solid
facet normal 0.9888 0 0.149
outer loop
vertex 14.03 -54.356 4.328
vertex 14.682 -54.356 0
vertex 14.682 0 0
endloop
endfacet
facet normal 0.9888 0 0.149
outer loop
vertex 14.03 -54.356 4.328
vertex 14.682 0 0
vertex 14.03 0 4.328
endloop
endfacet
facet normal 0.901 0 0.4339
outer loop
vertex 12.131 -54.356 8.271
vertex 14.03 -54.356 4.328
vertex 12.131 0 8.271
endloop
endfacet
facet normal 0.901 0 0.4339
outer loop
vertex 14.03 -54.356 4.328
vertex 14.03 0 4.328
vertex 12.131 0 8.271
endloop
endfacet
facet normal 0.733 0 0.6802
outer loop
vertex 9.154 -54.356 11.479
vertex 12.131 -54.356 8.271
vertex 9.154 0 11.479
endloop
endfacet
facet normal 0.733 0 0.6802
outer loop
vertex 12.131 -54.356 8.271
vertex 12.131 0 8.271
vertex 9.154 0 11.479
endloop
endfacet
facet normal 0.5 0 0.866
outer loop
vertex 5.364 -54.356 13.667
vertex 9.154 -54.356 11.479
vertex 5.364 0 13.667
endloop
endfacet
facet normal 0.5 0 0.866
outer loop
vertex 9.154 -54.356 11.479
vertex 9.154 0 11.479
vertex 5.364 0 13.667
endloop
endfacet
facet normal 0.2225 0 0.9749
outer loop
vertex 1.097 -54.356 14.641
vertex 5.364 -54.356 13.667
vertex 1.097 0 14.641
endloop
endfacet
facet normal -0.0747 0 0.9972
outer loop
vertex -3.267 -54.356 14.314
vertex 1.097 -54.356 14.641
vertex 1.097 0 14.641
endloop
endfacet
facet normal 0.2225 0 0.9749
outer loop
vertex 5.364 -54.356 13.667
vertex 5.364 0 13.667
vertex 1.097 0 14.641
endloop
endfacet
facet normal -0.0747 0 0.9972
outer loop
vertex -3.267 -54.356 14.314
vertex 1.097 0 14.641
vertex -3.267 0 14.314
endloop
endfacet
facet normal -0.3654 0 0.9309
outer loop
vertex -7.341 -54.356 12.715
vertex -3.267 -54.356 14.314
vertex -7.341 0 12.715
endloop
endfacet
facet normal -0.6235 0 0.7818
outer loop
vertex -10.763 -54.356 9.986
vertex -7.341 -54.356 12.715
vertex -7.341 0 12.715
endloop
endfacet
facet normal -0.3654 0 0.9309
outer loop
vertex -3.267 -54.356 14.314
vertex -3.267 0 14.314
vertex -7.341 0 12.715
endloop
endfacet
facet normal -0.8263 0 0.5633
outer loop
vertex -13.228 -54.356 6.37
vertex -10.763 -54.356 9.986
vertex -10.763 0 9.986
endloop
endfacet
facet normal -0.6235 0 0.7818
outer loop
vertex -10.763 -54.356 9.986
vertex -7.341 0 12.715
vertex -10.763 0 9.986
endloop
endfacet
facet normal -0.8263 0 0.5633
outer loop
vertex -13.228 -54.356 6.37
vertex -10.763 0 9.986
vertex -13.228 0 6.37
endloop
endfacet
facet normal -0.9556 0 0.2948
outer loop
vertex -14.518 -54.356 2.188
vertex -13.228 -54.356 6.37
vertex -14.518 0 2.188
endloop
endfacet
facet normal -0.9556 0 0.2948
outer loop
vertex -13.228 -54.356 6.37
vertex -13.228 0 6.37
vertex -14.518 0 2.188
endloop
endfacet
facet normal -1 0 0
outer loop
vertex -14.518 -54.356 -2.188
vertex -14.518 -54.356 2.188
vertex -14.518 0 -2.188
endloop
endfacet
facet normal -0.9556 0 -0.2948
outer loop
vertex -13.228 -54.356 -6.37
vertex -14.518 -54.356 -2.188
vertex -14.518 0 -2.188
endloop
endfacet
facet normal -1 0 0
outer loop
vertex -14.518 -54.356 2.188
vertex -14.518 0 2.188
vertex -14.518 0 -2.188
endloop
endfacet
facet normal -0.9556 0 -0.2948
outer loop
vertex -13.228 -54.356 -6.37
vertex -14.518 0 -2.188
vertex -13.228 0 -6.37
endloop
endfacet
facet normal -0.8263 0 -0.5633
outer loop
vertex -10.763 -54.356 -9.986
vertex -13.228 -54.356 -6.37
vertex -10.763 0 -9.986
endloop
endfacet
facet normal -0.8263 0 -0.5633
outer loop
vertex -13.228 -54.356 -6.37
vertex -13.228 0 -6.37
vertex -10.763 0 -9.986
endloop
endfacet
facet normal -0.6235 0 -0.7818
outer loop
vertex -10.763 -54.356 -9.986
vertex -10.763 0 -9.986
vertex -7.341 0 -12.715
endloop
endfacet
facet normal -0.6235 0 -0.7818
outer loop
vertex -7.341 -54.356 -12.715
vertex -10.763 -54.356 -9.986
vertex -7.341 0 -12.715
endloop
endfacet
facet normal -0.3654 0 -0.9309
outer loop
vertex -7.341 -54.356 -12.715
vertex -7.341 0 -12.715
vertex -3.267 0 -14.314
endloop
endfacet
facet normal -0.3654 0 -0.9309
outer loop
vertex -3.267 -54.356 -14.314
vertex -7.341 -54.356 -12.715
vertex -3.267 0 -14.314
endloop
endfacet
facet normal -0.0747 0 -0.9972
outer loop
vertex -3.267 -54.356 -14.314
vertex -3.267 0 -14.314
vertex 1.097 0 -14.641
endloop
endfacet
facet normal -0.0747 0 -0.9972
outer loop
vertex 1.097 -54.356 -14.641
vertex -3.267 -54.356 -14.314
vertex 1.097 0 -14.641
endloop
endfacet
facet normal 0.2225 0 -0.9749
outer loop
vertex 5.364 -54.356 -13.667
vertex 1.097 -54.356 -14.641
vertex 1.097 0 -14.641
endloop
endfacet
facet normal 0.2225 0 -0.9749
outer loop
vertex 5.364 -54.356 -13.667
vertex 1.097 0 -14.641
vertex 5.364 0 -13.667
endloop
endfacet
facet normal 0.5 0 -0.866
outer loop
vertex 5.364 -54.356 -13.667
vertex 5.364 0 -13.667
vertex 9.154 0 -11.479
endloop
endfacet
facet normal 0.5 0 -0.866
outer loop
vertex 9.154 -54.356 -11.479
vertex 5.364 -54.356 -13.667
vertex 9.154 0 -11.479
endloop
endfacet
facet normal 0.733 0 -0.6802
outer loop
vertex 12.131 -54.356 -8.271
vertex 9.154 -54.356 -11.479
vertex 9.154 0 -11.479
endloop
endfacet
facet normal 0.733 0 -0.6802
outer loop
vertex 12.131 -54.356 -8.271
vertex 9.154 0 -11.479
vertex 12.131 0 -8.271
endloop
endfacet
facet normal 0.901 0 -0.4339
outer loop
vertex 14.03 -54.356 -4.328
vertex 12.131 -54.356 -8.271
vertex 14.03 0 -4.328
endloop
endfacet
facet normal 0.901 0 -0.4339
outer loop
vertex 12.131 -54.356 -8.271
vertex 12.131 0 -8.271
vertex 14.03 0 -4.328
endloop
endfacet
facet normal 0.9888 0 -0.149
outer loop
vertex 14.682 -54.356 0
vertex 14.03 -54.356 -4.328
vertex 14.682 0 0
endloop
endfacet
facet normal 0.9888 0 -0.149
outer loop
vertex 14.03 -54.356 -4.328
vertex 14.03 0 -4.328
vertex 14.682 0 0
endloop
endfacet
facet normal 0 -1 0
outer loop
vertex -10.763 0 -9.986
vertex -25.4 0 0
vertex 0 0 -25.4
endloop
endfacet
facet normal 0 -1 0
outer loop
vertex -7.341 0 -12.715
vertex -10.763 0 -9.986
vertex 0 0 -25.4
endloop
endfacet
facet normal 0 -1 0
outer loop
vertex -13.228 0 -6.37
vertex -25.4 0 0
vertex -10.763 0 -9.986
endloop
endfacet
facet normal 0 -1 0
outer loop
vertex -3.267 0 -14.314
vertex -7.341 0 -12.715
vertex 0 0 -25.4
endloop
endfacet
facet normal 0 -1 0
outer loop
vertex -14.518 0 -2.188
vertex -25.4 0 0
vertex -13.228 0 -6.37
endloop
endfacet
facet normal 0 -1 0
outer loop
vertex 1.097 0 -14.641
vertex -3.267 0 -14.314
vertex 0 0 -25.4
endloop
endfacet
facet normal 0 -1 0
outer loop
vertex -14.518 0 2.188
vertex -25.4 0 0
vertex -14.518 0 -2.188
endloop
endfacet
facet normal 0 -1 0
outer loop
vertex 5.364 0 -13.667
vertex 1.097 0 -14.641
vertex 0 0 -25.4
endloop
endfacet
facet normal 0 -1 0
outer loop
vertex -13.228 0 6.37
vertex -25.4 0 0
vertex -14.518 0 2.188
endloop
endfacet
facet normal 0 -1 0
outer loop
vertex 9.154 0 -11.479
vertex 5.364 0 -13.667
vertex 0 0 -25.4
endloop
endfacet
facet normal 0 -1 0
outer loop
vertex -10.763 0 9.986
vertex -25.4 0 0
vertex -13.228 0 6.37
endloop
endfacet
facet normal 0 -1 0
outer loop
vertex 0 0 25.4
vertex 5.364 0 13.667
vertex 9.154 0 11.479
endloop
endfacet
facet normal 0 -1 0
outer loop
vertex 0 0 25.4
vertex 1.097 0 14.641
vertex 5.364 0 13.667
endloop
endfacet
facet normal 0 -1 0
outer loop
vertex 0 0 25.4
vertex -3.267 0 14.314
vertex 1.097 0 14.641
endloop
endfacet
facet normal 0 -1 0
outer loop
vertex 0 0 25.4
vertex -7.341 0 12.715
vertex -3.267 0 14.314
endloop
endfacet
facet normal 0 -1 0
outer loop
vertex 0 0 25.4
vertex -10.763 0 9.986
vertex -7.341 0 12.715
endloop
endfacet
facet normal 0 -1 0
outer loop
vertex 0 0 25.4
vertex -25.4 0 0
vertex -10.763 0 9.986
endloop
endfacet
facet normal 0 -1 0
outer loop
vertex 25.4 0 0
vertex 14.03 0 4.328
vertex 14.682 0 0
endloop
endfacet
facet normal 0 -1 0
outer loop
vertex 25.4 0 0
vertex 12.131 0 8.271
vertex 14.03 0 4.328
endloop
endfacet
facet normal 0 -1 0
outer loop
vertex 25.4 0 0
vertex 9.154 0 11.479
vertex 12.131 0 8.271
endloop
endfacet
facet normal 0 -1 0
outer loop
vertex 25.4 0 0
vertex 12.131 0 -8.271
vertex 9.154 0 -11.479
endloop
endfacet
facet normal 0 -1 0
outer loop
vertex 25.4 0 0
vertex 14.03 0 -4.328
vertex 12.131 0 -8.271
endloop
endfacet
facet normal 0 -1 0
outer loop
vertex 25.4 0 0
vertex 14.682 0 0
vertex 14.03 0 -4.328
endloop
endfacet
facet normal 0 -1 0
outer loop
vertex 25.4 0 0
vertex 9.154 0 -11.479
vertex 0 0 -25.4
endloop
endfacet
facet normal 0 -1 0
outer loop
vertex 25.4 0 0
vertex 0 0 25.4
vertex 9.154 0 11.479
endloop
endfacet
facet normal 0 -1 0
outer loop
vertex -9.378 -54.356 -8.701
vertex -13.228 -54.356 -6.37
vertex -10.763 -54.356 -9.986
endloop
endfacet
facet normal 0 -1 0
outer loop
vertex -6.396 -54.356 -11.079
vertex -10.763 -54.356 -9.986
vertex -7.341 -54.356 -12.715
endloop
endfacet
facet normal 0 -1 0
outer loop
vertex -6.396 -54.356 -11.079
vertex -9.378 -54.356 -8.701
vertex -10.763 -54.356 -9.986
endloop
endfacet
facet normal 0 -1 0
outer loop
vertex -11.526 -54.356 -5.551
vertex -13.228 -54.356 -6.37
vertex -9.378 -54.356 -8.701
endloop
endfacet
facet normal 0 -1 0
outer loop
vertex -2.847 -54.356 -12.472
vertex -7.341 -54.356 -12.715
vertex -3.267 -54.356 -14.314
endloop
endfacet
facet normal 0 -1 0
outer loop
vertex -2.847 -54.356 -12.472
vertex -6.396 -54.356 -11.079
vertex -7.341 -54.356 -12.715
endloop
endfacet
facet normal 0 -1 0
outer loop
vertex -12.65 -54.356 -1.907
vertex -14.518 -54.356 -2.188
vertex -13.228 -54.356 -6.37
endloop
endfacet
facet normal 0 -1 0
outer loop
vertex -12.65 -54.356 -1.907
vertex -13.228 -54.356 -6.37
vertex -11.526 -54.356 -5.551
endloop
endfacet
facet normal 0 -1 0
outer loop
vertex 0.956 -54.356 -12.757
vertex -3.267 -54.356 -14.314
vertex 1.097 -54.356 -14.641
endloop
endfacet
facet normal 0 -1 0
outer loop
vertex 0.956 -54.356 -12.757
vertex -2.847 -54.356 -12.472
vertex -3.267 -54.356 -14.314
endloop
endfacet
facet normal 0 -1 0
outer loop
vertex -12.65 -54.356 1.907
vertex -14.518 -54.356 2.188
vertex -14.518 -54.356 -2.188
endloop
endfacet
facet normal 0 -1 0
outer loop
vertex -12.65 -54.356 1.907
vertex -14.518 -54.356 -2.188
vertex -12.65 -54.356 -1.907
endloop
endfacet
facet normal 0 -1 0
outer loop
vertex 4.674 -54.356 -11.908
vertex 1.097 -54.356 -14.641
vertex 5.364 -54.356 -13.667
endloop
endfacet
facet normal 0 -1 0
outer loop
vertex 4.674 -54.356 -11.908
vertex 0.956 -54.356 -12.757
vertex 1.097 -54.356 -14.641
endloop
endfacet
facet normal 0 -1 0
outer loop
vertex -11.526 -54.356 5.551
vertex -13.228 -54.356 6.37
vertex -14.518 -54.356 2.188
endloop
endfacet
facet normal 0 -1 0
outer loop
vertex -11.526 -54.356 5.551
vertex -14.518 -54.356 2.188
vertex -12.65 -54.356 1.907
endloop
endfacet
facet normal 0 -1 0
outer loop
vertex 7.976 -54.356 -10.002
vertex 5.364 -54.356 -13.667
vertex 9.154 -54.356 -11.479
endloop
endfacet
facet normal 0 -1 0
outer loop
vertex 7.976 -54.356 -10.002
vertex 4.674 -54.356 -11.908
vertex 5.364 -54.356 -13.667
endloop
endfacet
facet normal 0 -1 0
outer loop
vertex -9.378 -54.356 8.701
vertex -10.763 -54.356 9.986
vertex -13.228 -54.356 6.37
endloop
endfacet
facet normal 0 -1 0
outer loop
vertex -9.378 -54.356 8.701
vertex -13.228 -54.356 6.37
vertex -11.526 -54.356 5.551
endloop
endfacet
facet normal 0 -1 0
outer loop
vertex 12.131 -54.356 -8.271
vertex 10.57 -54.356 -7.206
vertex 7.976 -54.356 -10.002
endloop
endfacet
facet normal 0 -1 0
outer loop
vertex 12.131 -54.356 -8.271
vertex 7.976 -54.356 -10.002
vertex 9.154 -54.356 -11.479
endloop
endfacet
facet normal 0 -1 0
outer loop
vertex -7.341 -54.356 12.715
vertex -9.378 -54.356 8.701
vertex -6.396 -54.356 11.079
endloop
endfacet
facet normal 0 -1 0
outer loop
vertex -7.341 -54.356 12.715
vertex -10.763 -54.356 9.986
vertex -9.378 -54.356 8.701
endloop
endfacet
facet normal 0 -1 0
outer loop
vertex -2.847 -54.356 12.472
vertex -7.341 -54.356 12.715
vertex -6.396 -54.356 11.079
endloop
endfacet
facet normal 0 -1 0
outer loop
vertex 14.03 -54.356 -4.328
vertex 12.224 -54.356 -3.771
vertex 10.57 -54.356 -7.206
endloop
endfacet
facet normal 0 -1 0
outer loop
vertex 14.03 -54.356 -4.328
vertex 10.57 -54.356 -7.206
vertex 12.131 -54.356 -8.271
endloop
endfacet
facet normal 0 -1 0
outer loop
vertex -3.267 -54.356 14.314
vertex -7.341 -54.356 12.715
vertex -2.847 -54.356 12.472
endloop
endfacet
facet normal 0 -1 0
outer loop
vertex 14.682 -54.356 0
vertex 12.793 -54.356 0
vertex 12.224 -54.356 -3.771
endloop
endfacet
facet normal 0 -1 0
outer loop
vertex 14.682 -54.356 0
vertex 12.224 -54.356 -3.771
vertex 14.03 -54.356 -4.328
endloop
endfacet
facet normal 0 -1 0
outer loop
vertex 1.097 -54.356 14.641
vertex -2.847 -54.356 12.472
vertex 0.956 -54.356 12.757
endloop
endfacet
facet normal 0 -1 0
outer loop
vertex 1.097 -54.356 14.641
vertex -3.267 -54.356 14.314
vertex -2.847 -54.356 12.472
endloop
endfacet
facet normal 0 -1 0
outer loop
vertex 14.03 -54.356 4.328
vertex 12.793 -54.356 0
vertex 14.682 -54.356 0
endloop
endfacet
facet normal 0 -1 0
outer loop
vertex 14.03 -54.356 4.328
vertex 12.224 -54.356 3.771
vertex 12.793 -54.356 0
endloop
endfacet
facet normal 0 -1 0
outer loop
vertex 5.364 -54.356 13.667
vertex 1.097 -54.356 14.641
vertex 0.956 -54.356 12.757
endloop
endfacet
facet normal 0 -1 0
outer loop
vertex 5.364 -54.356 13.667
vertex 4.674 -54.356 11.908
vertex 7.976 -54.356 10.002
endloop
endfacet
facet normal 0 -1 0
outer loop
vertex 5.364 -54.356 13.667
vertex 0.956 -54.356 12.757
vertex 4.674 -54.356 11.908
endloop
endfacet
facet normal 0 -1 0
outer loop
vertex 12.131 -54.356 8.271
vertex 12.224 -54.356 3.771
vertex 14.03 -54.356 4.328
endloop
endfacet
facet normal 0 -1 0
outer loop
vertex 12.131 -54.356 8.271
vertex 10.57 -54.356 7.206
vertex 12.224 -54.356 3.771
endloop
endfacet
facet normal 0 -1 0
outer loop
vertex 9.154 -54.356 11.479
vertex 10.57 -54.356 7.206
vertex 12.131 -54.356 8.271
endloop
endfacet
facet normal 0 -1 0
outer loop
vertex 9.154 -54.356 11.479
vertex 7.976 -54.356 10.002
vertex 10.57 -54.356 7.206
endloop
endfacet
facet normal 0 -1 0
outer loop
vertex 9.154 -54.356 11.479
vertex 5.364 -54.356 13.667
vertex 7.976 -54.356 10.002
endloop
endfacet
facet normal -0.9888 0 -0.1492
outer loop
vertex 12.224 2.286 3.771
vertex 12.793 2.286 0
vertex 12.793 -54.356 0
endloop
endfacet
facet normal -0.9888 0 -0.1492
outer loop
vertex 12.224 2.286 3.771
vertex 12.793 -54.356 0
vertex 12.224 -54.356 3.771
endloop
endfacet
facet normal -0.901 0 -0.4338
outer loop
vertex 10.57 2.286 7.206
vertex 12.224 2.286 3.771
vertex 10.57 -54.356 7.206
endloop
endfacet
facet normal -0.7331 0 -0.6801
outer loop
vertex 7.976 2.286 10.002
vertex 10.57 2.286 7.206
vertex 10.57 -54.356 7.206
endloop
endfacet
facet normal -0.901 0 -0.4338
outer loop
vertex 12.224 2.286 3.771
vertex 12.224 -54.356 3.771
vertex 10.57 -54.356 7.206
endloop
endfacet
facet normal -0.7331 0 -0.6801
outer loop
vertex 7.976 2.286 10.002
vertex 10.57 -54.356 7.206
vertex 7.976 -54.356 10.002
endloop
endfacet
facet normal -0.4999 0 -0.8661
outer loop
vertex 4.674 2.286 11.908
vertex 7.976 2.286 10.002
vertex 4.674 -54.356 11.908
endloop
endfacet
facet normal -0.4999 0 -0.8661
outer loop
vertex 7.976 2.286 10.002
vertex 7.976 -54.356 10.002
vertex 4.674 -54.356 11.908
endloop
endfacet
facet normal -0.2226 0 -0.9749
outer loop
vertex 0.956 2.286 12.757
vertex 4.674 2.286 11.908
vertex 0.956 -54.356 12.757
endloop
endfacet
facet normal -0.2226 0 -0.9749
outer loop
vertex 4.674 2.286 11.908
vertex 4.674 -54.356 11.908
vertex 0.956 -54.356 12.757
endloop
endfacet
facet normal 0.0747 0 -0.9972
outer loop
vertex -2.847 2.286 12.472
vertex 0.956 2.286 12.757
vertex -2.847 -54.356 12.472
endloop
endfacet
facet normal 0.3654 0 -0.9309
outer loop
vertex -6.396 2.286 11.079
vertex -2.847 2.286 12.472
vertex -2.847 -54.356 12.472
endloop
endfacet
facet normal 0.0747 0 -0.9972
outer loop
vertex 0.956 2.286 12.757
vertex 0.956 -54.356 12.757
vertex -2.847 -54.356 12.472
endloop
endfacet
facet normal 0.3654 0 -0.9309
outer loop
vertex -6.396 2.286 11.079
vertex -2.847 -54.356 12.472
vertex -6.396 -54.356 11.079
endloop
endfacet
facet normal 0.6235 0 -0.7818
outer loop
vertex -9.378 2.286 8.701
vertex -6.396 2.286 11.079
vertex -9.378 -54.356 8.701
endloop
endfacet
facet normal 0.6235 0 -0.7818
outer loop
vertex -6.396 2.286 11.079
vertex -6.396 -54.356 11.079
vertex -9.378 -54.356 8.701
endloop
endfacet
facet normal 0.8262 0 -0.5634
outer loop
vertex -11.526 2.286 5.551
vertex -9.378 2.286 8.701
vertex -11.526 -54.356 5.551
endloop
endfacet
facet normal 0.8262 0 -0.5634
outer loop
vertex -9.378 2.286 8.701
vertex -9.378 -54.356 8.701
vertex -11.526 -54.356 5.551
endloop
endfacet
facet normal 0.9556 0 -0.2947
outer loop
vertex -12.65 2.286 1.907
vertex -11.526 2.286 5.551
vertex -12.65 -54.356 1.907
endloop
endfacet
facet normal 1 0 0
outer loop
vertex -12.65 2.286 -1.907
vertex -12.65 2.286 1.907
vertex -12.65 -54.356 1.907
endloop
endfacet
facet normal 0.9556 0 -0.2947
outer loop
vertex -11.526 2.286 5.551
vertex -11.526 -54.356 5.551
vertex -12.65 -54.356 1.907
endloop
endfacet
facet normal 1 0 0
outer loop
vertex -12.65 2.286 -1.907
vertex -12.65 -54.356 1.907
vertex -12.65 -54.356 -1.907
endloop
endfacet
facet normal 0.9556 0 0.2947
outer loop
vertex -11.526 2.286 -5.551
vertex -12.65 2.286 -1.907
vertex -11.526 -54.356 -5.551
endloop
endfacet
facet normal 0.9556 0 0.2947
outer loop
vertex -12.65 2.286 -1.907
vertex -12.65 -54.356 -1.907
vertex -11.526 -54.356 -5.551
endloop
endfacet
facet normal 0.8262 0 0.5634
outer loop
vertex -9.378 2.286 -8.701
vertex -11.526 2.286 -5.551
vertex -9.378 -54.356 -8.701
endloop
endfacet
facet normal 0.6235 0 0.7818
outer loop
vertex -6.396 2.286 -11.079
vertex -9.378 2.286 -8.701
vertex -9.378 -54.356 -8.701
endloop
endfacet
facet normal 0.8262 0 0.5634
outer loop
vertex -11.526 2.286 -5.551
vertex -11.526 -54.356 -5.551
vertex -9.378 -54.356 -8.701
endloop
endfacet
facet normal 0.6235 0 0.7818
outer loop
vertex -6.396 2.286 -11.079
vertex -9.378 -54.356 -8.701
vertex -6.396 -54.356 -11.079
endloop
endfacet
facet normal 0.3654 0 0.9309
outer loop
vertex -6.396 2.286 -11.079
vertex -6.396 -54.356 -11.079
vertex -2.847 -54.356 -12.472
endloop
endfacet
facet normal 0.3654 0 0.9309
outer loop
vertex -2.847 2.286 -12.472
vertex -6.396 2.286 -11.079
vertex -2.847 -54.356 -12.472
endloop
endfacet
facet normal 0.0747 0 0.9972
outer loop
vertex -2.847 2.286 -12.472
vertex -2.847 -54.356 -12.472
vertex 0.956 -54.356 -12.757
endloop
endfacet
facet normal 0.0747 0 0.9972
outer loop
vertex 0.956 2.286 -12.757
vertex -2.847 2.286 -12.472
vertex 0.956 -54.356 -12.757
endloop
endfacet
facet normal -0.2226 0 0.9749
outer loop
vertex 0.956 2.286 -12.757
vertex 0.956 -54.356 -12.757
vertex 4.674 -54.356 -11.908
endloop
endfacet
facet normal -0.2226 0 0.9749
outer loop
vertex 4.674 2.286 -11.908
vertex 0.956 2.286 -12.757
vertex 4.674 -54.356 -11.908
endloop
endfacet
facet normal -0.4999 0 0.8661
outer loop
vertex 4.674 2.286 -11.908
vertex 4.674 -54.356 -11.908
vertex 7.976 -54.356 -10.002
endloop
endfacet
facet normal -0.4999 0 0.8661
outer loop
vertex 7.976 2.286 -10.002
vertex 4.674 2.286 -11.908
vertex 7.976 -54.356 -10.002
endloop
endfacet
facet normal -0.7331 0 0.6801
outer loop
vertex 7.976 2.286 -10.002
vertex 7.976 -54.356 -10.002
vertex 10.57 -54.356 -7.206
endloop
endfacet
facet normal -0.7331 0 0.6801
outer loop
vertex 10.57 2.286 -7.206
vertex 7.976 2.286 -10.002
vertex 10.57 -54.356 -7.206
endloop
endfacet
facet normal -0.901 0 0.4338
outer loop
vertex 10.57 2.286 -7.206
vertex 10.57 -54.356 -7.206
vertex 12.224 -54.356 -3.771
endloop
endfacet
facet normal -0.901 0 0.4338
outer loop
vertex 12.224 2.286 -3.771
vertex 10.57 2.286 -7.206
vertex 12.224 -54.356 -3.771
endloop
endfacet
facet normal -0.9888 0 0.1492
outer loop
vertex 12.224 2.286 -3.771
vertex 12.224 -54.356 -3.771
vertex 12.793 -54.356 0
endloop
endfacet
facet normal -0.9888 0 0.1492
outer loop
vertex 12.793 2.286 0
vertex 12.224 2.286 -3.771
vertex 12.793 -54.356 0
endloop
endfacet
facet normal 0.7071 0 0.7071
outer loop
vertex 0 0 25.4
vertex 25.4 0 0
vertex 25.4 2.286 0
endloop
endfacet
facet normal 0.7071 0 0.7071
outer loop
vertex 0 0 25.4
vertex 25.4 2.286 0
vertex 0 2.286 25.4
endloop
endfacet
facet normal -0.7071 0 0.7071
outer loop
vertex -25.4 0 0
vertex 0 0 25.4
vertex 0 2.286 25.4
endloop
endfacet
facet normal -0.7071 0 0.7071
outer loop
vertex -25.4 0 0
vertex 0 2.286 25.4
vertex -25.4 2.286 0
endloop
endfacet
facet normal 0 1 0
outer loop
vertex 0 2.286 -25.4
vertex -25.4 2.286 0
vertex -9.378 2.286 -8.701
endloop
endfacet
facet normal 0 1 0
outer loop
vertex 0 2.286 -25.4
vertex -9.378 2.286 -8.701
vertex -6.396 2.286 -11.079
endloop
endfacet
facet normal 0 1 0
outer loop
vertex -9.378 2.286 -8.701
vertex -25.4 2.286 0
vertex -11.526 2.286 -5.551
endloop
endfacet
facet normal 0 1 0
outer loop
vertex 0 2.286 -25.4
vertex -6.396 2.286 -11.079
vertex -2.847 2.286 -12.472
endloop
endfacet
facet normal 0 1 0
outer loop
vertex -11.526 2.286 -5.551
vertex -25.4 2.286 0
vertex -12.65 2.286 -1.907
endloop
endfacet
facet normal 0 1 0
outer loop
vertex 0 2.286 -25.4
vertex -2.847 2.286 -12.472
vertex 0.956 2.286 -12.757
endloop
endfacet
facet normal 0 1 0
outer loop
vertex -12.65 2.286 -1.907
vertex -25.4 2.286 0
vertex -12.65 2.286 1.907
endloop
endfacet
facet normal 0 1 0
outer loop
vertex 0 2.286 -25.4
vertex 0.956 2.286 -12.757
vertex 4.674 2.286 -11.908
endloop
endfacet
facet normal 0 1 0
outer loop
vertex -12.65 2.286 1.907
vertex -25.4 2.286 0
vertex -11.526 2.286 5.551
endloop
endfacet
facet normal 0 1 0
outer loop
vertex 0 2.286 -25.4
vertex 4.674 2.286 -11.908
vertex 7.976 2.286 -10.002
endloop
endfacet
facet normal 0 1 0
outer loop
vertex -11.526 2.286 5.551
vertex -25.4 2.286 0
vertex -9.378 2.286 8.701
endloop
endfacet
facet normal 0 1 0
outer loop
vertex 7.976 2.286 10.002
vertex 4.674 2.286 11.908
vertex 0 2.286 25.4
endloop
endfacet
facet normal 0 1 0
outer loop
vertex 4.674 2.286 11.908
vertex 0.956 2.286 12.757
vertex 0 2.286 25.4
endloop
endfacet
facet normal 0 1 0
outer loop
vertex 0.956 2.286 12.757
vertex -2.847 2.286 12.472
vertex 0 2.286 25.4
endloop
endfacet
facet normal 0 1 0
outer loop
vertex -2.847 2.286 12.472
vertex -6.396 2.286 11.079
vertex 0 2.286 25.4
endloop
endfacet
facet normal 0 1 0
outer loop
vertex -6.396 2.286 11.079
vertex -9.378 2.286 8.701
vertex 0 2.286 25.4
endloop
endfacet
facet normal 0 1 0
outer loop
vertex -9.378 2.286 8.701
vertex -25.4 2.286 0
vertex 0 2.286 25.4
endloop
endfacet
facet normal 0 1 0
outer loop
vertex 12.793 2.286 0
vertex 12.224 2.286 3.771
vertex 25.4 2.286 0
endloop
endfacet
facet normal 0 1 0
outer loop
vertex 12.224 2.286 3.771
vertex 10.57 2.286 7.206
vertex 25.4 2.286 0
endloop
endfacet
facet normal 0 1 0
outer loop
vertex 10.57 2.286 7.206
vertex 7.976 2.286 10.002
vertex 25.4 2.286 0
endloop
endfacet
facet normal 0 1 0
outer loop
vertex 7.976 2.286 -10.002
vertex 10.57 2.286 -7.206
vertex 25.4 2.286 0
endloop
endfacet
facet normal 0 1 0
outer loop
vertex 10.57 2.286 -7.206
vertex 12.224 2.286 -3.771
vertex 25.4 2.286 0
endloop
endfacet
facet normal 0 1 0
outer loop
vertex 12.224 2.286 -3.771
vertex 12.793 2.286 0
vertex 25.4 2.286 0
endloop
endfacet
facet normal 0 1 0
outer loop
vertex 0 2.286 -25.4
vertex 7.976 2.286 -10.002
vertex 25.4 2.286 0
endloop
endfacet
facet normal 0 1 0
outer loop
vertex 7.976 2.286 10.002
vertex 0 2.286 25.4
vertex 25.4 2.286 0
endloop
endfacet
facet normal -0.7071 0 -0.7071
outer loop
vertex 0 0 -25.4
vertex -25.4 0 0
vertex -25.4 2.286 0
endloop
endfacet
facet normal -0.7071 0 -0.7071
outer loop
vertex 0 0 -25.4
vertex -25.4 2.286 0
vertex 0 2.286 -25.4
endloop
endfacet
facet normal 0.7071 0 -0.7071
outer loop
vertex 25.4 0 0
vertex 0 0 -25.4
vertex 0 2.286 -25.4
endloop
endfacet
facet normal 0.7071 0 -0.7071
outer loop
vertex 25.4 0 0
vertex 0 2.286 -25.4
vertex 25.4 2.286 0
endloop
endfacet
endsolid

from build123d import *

# Parameters (mm, degrees)
F2_DEPTH = 2.286
F1_R     = 14.68178
F3_DEPTH = 54.356
F4_R     = 12.792611
F5_DEPTH = 76.2


with BuildPart() as f2:
    # F0 (on Front) → F2 (new body)
    with BuildSketch(Plane.XZ):
        Polygon((0, 25.4), (-25.4, 0), (0, -25.4), (25.4, 0), align=None)
    extrude(amount=-F2_DEPTH)

    # F1 (on Front) → F3 (join)
    with BuildSketch(Plane.XZ):
        Circle(F1_R)
    extrude(amount=F3_DEPTH)

    # F4 (on face) → F5 (cut)
    with BuildSketch(Plane.XZ.offset(54.356)):
        Circle(F4_R)
    extrude(amount=-F5_DEPTH, mode=Mode.SUBTRACT)


solid = f2.part
